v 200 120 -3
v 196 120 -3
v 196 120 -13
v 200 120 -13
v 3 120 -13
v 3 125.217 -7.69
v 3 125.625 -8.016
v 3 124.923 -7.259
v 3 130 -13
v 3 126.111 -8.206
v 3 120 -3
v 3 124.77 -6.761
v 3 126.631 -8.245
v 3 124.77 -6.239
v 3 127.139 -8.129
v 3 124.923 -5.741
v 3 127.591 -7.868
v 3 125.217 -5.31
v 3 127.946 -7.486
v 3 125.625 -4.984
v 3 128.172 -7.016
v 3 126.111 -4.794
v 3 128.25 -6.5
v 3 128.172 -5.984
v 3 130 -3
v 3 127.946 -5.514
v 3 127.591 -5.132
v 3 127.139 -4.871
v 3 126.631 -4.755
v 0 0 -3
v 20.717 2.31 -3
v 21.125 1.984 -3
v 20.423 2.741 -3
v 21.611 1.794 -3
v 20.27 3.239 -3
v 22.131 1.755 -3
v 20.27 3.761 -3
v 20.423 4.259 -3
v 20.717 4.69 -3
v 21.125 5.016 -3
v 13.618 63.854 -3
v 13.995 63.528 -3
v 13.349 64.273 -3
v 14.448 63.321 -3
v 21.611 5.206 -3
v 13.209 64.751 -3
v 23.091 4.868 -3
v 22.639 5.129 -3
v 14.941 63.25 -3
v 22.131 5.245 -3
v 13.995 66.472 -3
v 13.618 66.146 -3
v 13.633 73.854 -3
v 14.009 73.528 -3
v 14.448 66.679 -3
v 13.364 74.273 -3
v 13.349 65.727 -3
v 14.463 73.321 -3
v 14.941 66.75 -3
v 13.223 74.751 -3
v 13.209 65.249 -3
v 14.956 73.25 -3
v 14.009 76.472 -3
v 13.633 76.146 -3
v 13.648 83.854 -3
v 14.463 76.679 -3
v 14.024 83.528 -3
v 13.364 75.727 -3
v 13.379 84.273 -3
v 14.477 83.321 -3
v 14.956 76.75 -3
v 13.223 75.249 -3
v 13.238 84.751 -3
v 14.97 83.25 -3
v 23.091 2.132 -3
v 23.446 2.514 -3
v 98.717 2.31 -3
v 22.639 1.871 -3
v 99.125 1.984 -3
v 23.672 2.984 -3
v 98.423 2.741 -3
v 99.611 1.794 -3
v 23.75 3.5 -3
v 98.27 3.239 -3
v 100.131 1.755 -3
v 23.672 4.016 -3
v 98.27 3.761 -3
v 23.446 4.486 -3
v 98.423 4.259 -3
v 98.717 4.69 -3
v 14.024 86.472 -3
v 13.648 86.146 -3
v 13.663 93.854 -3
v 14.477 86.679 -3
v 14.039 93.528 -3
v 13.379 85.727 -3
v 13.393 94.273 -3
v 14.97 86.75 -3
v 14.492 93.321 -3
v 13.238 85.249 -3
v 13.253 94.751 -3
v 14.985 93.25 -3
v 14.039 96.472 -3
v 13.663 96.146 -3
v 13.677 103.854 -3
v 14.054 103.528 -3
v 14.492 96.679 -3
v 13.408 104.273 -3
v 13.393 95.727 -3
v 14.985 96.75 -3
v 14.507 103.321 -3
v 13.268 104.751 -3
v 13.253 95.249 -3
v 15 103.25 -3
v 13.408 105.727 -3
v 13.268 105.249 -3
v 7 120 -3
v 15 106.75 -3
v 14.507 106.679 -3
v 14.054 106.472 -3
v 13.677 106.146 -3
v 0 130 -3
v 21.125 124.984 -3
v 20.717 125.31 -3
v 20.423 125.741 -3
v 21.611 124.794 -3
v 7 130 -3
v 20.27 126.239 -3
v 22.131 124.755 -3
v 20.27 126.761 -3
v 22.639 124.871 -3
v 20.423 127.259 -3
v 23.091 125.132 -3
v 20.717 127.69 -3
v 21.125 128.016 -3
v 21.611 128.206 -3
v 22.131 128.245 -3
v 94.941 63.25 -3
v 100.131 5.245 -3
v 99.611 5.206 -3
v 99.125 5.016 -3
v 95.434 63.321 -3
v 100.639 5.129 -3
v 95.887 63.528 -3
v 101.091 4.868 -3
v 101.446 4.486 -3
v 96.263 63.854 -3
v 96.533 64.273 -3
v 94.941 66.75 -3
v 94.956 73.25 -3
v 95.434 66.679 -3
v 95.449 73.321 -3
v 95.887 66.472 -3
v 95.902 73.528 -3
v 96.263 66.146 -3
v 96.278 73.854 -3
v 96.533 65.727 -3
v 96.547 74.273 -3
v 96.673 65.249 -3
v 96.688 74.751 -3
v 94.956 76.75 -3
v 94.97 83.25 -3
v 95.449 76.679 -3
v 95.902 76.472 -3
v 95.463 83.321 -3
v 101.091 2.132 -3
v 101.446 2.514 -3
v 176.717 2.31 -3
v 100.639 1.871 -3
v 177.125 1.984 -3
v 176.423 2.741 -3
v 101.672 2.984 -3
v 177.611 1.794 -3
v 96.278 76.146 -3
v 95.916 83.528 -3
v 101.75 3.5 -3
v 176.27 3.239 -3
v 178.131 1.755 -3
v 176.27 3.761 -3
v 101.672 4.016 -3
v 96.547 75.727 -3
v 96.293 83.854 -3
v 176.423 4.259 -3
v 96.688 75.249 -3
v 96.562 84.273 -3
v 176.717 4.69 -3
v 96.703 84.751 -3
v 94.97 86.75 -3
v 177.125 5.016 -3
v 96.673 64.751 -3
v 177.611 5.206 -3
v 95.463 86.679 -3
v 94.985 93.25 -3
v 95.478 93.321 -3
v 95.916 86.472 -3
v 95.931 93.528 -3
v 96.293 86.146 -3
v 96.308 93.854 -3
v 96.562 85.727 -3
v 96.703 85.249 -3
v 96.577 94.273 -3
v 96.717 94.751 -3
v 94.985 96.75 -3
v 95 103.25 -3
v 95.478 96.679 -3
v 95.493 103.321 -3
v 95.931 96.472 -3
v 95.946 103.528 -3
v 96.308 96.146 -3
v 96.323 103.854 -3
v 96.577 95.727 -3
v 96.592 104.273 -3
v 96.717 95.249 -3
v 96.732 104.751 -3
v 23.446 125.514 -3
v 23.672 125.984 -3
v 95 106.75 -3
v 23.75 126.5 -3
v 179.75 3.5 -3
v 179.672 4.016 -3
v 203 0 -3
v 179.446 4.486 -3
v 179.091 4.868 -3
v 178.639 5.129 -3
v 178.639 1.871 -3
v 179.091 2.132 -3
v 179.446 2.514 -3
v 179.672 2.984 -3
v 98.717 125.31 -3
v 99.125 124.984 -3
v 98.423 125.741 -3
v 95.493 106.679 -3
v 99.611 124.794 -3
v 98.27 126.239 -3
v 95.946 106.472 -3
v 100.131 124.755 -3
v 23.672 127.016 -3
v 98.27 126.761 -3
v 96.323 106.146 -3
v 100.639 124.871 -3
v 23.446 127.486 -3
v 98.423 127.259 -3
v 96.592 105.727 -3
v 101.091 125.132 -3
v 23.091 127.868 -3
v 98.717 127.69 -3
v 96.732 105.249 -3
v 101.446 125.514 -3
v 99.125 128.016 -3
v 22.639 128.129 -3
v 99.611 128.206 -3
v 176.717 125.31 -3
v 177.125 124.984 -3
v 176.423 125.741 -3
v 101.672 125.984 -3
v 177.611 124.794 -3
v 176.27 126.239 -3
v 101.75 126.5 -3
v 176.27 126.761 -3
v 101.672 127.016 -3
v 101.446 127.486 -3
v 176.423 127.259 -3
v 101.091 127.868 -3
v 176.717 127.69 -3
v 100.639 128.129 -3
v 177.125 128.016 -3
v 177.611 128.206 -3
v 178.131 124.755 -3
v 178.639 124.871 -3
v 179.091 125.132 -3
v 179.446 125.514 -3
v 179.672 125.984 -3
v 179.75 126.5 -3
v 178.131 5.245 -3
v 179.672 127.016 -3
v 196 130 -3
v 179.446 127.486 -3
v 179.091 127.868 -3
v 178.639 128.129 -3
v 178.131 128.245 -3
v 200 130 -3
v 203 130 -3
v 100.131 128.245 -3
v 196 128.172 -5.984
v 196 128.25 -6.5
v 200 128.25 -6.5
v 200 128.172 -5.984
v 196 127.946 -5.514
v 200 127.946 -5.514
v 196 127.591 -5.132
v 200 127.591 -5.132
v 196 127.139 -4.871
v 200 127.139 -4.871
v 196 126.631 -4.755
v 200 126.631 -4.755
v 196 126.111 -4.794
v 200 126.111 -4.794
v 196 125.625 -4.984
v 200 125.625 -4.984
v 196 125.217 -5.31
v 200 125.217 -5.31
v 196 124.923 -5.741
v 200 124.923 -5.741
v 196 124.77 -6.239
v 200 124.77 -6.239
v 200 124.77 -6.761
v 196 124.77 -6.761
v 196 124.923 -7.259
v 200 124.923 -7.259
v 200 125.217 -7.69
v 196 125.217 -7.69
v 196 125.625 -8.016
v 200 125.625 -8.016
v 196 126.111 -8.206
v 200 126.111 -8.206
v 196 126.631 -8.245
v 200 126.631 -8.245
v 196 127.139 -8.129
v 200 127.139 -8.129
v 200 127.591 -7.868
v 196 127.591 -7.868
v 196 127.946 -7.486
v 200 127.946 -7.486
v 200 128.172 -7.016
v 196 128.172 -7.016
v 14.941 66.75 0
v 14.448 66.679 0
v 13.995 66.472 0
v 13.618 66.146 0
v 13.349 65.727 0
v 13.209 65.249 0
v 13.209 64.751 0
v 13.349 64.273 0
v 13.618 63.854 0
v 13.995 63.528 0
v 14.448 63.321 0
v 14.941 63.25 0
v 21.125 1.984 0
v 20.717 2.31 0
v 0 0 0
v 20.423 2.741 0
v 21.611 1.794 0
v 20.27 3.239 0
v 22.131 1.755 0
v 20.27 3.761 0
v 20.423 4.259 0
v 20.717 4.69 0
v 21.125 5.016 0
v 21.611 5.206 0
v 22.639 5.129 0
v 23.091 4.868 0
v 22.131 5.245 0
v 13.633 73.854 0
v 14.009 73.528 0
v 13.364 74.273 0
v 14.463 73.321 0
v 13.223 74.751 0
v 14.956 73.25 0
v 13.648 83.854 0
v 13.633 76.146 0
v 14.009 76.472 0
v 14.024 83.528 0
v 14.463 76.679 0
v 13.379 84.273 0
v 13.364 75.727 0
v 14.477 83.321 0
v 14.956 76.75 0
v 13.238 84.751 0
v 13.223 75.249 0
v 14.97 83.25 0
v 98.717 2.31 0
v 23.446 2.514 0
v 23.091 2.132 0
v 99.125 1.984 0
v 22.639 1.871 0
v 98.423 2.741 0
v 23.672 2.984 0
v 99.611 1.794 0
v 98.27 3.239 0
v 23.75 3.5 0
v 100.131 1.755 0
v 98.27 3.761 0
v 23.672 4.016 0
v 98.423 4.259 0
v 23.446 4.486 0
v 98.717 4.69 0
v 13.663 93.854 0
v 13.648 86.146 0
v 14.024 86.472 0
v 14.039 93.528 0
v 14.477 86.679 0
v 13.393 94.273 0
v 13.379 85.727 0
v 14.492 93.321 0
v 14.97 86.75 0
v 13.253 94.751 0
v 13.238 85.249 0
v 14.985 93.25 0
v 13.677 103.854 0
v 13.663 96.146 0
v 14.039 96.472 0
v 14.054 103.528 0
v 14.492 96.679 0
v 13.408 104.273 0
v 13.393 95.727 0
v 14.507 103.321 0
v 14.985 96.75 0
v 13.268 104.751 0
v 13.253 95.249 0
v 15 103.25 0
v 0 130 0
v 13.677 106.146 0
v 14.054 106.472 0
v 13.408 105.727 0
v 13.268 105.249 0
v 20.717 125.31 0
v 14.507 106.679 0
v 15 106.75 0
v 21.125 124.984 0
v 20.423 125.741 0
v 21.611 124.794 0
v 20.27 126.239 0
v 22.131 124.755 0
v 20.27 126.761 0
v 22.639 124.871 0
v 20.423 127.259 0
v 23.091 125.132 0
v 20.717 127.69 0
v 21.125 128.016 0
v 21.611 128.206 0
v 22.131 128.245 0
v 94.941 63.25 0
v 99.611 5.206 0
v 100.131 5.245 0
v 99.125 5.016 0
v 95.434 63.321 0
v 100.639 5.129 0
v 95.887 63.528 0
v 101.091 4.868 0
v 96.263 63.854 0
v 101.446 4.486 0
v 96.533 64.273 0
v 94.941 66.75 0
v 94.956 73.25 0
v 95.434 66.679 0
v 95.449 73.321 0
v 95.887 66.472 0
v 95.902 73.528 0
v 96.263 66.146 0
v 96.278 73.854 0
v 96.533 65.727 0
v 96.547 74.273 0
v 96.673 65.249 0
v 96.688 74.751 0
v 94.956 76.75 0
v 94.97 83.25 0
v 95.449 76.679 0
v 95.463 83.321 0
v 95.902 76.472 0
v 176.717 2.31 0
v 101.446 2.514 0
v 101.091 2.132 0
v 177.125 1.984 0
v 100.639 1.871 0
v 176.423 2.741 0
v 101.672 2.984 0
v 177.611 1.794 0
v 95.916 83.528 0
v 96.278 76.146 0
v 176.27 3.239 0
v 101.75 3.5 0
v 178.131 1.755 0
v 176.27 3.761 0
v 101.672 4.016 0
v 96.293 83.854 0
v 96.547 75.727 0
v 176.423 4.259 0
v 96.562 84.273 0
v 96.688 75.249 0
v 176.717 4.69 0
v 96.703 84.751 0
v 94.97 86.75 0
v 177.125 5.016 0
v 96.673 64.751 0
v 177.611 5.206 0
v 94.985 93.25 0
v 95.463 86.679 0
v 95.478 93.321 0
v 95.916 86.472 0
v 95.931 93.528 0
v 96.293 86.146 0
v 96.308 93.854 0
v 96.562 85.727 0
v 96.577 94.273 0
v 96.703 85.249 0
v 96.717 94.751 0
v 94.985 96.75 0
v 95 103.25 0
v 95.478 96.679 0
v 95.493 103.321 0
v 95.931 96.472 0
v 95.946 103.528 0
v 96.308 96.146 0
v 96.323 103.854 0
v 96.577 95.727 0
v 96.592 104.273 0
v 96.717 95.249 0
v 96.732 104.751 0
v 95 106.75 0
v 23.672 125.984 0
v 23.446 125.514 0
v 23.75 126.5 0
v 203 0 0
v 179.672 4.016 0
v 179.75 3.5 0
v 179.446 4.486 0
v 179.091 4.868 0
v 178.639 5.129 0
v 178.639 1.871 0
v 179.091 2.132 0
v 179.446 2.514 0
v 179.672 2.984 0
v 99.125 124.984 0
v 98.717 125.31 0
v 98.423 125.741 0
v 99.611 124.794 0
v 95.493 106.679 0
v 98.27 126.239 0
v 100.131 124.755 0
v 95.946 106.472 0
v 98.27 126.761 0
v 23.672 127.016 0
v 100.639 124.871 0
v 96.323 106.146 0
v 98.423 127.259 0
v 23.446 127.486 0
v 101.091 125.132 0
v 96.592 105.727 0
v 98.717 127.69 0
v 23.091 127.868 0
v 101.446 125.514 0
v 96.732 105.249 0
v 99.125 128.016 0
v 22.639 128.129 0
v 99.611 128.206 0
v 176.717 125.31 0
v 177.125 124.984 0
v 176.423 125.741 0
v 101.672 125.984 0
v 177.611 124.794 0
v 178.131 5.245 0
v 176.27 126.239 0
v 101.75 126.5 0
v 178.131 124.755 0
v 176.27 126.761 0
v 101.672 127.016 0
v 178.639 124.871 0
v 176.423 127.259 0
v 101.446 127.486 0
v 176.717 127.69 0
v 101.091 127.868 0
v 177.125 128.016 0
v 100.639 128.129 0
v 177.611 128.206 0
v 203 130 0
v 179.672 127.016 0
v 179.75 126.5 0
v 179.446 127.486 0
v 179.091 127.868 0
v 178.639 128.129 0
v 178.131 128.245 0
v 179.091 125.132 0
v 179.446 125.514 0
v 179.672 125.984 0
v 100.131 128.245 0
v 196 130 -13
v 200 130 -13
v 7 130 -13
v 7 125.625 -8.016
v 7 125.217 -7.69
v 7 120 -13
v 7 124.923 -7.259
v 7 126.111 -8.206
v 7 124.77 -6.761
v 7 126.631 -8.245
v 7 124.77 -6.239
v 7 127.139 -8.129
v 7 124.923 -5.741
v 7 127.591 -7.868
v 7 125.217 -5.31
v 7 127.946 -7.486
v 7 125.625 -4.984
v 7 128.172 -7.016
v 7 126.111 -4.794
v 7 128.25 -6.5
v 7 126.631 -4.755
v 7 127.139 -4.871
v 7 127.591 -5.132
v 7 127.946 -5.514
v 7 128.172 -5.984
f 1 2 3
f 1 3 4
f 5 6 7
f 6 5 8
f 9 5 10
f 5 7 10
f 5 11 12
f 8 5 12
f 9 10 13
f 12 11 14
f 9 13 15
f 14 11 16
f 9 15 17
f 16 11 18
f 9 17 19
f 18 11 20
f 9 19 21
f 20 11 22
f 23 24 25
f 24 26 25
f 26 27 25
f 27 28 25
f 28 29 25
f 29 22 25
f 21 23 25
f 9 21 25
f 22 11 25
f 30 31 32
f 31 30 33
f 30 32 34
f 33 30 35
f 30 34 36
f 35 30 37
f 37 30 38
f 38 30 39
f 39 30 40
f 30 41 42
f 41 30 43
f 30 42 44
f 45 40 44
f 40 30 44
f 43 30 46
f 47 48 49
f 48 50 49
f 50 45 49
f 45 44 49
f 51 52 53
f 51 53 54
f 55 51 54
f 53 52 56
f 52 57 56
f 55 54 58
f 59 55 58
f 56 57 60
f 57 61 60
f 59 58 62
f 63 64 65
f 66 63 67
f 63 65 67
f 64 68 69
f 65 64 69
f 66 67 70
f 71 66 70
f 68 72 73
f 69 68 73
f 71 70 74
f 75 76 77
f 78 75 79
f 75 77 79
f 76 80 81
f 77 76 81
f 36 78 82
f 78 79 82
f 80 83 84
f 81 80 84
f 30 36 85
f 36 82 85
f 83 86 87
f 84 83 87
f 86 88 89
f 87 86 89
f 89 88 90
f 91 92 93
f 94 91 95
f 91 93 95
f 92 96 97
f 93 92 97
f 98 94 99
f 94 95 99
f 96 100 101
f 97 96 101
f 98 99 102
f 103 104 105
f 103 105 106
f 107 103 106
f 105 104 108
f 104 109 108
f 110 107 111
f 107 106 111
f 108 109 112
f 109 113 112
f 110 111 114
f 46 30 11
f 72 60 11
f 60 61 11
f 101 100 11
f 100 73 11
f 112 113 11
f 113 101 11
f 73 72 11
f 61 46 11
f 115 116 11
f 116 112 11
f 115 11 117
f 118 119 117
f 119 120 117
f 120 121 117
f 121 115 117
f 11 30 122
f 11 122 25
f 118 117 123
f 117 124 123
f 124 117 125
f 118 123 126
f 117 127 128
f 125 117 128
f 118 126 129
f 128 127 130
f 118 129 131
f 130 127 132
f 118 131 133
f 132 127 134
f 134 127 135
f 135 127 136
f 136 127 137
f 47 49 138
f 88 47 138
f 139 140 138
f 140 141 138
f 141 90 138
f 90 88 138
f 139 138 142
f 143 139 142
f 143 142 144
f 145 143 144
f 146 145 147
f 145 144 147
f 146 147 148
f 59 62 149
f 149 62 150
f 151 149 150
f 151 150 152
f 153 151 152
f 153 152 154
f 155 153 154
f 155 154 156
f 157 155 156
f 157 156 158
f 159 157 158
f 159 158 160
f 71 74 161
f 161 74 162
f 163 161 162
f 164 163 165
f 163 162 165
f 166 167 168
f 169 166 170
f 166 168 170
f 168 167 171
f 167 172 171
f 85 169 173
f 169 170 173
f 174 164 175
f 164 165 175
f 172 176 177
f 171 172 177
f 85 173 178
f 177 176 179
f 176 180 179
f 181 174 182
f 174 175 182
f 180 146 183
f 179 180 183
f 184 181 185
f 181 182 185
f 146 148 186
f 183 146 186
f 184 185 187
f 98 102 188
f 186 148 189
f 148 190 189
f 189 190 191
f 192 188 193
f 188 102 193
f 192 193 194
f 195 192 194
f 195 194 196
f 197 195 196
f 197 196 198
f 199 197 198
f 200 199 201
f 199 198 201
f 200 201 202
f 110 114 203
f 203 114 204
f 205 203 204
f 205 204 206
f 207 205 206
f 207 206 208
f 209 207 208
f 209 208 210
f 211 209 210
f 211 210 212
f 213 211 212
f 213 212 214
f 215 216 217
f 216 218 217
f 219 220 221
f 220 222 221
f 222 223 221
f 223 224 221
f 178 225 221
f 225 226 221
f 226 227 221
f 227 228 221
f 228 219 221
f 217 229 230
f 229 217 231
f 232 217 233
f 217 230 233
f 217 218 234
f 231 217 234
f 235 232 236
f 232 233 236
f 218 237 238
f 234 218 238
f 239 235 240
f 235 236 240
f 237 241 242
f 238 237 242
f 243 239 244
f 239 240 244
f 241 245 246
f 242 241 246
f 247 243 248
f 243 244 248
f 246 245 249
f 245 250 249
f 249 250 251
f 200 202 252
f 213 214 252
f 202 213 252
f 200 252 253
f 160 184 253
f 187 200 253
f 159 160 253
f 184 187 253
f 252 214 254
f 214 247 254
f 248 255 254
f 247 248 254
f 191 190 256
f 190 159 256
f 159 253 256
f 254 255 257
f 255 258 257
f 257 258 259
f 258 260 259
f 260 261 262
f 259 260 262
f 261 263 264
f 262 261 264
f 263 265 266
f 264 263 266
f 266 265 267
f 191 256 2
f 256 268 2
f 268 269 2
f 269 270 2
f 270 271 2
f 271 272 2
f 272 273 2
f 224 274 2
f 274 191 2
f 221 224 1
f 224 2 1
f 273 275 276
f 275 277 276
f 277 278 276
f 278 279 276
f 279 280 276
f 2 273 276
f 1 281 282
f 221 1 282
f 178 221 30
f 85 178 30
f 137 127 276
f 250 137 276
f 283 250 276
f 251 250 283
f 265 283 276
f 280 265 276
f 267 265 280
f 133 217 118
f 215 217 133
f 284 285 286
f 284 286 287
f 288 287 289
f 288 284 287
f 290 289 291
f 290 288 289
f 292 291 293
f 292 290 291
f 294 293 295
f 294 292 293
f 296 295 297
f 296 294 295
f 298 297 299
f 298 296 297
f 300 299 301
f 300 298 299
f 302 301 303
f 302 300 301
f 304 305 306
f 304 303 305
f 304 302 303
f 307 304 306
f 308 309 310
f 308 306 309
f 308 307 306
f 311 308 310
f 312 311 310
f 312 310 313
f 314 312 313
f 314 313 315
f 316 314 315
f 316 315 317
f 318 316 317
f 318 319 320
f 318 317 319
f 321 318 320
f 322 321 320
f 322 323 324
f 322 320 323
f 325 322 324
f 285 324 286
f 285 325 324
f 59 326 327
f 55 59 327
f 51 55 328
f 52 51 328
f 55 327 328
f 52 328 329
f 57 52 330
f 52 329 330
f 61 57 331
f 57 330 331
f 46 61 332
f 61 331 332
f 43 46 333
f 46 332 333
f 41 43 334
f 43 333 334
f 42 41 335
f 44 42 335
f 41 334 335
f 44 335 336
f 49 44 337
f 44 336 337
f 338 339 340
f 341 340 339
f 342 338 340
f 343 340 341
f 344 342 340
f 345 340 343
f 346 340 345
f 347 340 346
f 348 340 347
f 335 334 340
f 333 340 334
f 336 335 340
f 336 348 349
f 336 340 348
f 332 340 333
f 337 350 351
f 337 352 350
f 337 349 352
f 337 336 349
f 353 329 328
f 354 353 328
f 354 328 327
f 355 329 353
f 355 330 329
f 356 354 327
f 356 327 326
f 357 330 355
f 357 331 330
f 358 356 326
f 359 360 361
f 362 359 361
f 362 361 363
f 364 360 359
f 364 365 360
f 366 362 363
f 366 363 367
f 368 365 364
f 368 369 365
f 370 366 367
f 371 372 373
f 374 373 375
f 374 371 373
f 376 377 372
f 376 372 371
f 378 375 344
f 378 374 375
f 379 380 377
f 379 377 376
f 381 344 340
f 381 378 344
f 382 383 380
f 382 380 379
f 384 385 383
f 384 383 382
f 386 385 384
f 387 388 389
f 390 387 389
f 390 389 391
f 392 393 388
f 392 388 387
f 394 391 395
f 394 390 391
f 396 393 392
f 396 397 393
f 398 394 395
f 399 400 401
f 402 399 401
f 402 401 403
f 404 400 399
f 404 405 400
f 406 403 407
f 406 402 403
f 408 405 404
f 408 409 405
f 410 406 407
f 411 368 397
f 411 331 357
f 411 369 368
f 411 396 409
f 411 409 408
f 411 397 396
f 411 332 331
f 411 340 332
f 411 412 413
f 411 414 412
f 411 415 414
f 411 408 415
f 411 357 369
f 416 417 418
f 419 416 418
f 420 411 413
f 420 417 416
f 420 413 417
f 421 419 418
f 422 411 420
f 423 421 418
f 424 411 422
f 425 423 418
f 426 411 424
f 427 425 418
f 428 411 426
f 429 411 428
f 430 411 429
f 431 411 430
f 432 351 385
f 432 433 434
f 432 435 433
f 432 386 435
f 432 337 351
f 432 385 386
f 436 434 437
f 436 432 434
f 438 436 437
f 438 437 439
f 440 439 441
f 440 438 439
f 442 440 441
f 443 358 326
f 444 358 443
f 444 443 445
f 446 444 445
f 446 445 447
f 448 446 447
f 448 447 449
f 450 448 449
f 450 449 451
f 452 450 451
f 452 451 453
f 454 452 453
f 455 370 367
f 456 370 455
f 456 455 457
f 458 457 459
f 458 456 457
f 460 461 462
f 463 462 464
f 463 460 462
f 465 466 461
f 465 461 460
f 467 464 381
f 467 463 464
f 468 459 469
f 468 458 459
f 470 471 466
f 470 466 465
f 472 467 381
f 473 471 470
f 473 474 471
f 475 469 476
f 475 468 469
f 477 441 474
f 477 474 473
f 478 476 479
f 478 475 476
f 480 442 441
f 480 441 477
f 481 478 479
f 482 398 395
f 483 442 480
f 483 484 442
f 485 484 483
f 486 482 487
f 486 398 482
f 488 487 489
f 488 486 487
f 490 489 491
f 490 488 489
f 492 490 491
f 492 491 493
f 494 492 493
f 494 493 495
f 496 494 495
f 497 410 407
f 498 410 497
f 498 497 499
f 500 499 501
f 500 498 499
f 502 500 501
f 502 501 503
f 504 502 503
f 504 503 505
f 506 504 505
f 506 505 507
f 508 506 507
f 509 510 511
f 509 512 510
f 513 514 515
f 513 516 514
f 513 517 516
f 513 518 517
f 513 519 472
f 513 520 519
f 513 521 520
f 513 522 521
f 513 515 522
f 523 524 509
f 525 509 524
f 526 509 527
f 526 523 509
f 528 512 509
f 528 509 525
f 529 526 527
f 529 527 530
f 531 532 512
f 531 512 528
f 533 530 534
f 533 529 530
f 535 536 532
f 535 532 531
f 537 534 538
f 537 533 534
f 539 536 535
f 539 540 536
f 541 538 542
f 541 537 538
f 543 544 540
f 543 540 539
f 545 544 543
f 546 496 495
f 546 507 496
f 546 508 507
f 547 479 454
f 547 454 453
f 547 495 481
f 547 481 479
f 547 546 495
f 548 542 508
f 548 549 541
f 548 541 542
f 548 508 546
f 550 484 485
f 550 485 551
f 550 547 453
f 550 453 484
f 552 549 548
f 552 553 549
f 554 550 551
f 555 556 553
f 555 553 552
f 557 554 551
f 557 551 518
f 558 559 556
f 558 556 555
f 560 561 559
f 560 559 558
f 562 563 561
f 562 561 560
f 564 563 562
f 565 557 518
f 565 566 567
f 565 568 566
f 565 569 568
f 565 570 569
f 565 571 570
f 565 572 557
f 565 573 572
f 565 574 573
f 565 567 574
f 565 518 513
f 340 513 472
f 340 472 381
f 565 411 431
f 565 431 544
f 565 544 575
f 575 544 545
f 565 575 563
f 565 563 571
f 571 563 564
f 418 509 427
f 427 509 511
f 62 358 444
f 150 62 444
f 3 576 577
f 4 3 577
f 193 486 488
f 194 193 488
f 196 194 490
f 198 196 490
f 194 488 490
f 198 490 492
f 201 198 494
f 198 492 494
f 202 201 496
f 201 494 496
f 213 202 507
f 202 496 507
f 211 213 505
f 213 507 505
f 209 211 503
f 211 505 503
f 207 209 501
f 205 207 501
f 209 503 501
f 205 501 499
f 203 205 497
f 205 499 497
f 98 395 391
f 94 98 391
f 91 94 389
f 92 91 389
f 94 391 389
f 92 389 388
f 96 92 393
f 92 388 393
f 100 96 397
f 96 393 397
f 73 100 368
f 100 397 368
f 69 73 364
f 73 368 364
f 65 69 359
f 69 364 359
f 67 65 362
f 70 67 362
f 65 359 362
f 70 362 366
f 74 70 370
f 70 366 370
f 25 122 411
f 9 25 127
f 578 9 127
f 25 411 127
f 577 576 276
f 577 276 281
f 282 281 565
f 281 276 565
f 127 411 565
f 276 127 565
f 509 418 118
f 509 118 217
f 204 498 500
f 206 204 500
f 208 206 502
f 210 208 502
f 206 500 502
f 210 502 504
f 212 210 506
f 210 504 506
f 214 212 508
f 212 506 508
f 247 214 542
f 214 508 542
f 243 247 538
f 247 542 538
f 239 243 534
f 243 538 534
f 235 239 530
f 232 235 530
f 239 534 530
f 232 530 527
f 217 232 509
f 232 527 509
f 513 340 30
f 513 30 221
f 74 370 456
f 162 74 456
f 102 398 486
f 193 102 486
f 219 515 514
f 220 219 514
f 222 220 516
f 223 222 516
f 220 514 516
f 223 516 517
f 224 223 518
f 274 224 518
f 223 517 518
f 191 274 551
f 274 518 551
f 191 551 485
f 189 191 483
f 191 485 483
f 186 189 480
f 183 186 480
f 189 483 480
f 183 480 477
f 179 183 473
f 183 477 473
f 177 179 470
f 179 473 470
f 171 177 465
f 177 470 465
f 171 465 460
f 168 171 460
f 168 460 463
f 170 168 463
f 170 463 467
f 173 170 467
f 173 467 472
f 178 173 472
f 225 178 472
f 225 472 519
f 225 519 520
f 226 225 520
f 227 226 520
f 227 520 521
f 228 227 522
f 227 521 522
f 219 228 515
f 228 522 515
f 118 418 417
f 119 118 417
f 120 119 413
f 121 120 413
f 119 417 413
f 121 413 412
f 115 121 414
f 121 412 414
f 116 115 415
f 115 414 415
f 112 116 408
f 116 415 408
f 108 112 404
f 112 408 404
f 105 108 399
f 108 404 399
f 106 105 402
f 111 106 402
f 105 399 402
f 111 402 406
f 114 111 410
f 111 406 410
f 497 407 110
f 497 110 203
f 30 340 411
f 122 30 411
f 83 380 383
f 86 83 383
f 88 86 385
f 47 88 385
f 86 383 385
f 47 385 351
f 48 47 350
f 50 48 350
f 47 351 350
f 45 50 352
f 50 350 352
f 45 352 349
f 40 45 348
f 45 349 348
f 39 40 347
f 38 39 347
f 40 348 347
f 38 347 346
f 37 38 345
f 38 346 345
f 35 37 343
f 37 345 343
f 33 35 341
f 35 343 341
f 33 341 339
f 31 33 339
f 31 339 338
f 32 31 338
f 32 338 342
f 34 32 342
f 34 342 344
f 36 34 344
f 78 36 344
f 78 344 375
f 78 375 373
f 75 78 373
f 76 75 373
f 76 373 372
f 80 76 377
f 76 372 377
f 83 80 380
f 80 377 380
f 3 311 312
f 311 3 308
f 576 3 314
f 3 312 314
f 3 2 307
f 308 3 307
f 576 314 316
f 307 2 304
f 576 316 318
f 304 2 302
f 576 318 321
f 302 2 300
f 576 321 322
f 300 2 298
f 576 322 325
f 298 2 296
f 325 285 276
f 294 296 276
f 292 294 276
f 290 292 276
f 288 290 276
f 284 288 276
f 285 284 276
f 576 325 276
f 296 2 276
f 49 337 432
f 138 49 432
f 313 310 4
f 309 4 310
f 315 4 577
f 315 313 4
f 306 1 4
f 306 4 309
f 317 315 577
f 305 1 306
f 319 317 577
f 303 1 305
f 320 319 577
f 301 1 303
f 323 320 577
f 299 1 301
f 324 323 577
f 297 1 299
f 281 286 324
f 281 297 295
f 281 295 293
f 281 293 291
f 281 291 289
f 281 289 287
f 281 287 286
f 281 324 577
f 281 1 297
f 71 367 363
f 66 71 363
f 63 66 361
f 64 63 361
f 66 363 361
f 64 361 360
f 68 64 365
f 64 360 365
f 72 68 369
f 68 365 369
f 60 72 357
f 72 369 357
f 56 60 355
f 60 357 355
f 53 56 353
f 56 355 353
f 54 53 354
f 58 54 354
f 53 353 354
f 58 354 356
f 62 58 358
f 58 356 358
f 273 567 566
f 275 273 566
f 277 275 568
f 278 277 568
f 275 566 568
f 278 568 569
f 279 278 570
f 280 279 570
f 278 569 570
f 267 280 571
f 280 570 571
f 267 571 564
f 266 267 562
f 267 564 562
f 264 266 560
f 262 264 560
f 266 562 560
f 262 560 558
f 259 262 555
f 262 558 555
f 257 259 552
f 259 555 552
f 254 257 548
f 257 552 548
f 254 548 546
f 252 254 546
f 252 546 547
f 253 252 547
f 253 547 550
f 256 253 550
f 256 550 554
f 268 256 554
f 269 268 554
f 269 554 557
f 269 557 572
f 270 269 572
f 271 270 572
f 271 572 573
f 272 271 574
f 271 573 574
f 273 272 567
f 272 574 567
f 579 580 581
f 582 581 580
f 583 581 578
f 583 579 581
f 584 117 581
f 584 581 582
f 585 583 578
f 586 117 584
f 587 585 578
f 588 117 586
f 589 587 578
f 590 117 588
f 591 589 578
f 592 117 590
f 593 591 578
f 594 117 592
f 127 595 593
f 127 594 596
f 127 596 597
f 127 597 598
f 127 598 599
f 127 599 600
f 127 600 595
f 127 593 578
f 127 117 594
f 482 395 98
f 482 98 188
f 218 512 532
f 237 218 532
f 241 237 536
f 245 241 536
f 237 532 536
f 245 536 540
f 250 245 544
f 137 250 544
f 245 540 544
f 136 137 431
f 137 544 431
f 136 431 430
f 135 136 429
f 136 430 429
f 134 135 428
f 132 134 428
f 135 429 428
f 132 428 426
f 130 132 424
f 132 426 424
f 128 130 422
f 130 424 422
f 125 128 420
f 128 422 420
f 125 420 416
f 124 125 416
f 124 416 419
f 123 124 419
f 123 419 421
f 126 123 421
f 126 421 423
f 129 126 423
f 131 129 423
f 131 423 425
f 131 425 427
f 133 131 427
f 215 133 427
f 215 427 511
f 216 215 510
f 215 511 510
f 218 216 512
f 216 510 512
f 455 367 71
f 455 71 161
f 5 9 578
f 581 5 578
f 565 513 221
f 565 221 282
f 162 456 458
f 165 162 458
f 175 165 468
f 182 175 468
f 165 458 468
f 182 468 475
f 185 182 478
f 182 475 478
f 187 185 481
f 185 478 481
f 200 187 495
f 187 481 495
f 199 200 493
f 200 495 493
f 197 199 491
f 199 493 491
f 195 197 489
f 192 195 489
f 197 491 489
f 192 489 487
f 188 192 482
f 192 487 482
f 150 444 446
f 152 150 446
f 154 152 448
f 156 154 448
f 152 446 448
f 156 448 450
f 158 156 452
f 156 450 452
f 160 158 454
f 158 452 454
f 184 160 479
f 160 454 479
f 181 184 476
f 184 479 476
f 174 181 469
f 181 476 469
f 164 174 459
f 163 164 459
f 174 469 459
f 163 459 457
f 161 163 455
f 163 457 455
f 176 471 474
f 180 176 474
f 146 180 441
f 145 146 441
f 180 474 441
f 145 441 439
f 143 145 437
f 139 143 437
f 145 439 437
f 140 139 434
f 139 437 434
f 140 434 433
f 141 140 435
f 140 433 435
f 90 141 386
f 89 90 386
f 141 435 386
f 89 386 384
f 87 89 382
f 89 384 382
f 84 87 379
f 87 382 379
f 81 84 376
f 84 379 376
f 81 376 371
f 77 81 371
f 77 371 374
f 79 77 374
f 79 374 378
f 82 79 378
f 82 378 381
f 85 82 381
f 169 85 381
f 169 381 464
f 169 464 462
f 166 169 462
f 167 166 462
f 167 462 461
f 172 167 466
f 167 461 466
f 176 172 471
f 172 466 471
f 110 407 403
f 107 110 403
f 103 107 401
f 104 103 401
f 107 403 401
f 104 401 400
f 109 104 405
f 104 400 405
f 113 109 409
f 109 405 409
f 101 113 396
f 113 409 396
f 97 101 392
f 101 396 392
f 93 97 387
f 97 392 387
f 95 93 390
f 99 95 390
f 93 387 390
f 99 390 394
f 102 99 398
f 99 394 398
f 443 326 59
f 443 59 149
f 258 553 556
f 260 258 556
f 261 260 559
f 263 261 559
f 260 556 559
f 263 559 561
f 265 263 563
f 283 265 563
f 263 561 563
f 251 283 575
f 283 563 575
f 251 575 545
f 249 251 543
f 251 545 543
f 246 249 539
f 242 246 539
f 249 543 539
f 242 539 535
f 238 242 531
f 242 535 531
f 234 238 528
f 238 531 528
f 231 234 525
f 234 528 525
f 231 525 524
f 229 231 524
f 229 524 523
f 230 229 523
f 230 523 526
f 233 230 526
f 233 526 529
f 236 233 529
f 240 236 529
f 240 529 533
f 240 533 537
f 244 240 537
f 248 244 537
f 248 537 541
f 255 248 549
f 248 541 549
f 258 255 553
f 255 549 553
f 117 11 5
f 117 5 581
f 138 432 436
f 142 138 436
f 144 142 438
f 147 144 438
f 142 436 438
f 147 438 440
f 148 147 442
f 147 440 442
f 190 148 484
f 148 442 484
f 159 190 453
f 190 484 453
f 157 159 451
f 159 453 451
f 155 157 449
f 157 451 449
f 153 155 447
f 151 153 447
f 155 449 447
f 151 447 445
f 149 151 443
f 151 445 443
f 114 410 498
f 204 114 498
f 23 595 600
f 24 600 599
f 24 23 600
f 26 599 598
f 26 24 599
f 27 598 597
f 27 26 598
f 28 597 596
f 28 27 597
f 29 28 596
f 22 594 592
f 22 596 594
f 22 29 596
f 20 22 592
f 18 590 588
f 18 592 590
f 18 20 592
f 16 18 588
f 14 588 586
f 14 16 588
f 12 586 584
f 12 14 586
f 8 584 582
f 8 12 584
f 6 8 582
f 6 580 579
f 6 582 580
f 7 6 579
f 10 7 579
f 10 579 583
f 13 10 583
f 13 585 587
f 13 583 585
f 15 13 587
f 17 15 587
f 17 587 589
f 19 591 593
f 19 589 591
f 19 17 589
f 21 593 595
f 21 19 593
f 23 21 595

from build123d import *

# Parameters (mm, degrees)
SKETCH_W        = 203
SKETCH_H        = 130
SKETCH_R        = 1.75
PAD_DEPTH       = 3
SKETCH001_W     = 4
SKETCH001_H     = 10
PAD001_DEPTH    = 10
SKETCH002_R     = 1.75
SKETCH002_W     = 95
SKETCH002_H     = 4
POCKET_DEPTH    = 225
SKETCH003_R     = 1.75
POCKET001_DEPTH = 200.001


with BuildPart() as part:
    # Sketch → Pad (new body)
    with BuildSketch(Plane.XY):
        with Locations((101.5, 65)):
            Rectangle(SKETCH_W, SKETCH_H)
        with Locations((22, 126.5)):
            Circle(SKETCH_R, mode=Mode.SUBTRACT)
        with Locations((100, 126.5)):
            Circle(SKETCH_R, mode=Mode.SUBTRACT)
        with Locations((178, 126.5)):
            Circle(SKETCH_R, mode=Mode.SUBTRACT)
        with Locations((22, 3.5)):
            Circle(SKETCH_R, mode=Mode.SUBTRACT)
        with Locations((100, 3.5)):
            Circle(SKETCH_R, mode=Mode.SUBTRACT)
        with Locations((178, 3.5)):
            Circle(SKETCH_R, mode=Mode.SUBTRACT)
        with BuildLine():
            ThreePointArc((15, 106.75), (13.25, 105), (15, 103.25))
            Line((15, 103.25), (95, 103.25))
            ThreePointArc((95, 103.25), (96.75, 105), (95, 106.75))
            Line((15, 106.75), (95, 106.75))
        make_face(mode=Mode.SUBTRACT)
        with BuildLine():
            ThreePointArc((14.985188, 96.750011), (13.235188, 95.000011), (14.985188, 93.250011))
            Line((14.985188, 93.250011), (94.985188, 93.250011))
            ThreePointArc((94.985188, 93.250011), (96.735188, 95.000011), (94.985188, 96.750011))
            Line((14.985188, 96.750011), (94.985188, 96.750011))
        make_face(mode=Mode.SUBTRACT)
        with BuildLine():
            ThreePointArc((14.970376, 86.750022), (13.220376, 85.000022), (14.970376, 83.250022))
            Line((14.970376, 83.250022), (94.970376, 83.250022))
            ThreePointArc((94.970376, 83.250022), (96.720376, 85.000022), (94.970376, 86.750022))
            Line((14.970376, 86.750022), (94.970376, 86.750022))
        make_face(mode=Mode.SUBTRACT)
        with BuildLine():
            ThreePointArc((14.955564, 76.750033), (13.205564, 75.000033), (14.955564, 73.250033))
            Line((14.955564, 73.250033), (94.955564, 73.250033))
            ThreePointArc((94.955564, 73.250033), (96.705564, 75.000033), (94.955564, 76.750033))
            Line((14.955564, 76.750033), (94.955564, 76.750033))
        make_face(mode=Mode.SUBTRACT)
        with BuildLine():
            ThreePointArc((14.940752, 66.750044), (13.190752, 65.000044), (14.940752, 63.250044))
            Line((14.940752, 63.250044), (94.940752, 63.250044))
            ThreePointArc((94.940752, 63.250044), (96.690752, 65.000044), (94.940752, 66.750044))
            Line((14.940752, 66.750044), (94.940752, 66.750044))
        make_face(mode=Mode.SUBTRACT)
    extrude(amount=-PAD_DEPTH)

    # Sketch001 (on DatumPlane) → Pad001 (join)
    with BuildSketch(Plane.XY.offset(-3)):
        with Locations((198, 125)):
            Rectangle(SKETCH001_W, SKETCH001_H)
        with Locations((5, 125)):
            Rectangle(SKETCH001_W, SKETCH001_H)
    extrude(amount=-PAD001_DEPTH)

    # Sketch002 → Pocket (cut)
    with BuildSketch(Plane.YZ.offset(107)):
        with Locations((-51, 7)):
            Circle(SKETCH002_R)
        with Locations((61, 7)):
            Circle(SKETCH002_R)
        with Locations((7.5, 11)):
            Rectangle(SKETCH002_W, SKETCH002_H)
    extrude(amount=-POCKET_DEPTH, mode=Mode.SUBTRACT)

    # Sketch003 (on DatumPlane) → Pocket001 (cut, through all)
    with BuildSketch(Plane.YZ.offset(3)):
        with Locations((126.5, -6.5)):
            Circle(SKETCH003_R)
    extrude(amount=POCKET001_DEPTH, mode=Mode.SUBTRACT)


solid = part.part
